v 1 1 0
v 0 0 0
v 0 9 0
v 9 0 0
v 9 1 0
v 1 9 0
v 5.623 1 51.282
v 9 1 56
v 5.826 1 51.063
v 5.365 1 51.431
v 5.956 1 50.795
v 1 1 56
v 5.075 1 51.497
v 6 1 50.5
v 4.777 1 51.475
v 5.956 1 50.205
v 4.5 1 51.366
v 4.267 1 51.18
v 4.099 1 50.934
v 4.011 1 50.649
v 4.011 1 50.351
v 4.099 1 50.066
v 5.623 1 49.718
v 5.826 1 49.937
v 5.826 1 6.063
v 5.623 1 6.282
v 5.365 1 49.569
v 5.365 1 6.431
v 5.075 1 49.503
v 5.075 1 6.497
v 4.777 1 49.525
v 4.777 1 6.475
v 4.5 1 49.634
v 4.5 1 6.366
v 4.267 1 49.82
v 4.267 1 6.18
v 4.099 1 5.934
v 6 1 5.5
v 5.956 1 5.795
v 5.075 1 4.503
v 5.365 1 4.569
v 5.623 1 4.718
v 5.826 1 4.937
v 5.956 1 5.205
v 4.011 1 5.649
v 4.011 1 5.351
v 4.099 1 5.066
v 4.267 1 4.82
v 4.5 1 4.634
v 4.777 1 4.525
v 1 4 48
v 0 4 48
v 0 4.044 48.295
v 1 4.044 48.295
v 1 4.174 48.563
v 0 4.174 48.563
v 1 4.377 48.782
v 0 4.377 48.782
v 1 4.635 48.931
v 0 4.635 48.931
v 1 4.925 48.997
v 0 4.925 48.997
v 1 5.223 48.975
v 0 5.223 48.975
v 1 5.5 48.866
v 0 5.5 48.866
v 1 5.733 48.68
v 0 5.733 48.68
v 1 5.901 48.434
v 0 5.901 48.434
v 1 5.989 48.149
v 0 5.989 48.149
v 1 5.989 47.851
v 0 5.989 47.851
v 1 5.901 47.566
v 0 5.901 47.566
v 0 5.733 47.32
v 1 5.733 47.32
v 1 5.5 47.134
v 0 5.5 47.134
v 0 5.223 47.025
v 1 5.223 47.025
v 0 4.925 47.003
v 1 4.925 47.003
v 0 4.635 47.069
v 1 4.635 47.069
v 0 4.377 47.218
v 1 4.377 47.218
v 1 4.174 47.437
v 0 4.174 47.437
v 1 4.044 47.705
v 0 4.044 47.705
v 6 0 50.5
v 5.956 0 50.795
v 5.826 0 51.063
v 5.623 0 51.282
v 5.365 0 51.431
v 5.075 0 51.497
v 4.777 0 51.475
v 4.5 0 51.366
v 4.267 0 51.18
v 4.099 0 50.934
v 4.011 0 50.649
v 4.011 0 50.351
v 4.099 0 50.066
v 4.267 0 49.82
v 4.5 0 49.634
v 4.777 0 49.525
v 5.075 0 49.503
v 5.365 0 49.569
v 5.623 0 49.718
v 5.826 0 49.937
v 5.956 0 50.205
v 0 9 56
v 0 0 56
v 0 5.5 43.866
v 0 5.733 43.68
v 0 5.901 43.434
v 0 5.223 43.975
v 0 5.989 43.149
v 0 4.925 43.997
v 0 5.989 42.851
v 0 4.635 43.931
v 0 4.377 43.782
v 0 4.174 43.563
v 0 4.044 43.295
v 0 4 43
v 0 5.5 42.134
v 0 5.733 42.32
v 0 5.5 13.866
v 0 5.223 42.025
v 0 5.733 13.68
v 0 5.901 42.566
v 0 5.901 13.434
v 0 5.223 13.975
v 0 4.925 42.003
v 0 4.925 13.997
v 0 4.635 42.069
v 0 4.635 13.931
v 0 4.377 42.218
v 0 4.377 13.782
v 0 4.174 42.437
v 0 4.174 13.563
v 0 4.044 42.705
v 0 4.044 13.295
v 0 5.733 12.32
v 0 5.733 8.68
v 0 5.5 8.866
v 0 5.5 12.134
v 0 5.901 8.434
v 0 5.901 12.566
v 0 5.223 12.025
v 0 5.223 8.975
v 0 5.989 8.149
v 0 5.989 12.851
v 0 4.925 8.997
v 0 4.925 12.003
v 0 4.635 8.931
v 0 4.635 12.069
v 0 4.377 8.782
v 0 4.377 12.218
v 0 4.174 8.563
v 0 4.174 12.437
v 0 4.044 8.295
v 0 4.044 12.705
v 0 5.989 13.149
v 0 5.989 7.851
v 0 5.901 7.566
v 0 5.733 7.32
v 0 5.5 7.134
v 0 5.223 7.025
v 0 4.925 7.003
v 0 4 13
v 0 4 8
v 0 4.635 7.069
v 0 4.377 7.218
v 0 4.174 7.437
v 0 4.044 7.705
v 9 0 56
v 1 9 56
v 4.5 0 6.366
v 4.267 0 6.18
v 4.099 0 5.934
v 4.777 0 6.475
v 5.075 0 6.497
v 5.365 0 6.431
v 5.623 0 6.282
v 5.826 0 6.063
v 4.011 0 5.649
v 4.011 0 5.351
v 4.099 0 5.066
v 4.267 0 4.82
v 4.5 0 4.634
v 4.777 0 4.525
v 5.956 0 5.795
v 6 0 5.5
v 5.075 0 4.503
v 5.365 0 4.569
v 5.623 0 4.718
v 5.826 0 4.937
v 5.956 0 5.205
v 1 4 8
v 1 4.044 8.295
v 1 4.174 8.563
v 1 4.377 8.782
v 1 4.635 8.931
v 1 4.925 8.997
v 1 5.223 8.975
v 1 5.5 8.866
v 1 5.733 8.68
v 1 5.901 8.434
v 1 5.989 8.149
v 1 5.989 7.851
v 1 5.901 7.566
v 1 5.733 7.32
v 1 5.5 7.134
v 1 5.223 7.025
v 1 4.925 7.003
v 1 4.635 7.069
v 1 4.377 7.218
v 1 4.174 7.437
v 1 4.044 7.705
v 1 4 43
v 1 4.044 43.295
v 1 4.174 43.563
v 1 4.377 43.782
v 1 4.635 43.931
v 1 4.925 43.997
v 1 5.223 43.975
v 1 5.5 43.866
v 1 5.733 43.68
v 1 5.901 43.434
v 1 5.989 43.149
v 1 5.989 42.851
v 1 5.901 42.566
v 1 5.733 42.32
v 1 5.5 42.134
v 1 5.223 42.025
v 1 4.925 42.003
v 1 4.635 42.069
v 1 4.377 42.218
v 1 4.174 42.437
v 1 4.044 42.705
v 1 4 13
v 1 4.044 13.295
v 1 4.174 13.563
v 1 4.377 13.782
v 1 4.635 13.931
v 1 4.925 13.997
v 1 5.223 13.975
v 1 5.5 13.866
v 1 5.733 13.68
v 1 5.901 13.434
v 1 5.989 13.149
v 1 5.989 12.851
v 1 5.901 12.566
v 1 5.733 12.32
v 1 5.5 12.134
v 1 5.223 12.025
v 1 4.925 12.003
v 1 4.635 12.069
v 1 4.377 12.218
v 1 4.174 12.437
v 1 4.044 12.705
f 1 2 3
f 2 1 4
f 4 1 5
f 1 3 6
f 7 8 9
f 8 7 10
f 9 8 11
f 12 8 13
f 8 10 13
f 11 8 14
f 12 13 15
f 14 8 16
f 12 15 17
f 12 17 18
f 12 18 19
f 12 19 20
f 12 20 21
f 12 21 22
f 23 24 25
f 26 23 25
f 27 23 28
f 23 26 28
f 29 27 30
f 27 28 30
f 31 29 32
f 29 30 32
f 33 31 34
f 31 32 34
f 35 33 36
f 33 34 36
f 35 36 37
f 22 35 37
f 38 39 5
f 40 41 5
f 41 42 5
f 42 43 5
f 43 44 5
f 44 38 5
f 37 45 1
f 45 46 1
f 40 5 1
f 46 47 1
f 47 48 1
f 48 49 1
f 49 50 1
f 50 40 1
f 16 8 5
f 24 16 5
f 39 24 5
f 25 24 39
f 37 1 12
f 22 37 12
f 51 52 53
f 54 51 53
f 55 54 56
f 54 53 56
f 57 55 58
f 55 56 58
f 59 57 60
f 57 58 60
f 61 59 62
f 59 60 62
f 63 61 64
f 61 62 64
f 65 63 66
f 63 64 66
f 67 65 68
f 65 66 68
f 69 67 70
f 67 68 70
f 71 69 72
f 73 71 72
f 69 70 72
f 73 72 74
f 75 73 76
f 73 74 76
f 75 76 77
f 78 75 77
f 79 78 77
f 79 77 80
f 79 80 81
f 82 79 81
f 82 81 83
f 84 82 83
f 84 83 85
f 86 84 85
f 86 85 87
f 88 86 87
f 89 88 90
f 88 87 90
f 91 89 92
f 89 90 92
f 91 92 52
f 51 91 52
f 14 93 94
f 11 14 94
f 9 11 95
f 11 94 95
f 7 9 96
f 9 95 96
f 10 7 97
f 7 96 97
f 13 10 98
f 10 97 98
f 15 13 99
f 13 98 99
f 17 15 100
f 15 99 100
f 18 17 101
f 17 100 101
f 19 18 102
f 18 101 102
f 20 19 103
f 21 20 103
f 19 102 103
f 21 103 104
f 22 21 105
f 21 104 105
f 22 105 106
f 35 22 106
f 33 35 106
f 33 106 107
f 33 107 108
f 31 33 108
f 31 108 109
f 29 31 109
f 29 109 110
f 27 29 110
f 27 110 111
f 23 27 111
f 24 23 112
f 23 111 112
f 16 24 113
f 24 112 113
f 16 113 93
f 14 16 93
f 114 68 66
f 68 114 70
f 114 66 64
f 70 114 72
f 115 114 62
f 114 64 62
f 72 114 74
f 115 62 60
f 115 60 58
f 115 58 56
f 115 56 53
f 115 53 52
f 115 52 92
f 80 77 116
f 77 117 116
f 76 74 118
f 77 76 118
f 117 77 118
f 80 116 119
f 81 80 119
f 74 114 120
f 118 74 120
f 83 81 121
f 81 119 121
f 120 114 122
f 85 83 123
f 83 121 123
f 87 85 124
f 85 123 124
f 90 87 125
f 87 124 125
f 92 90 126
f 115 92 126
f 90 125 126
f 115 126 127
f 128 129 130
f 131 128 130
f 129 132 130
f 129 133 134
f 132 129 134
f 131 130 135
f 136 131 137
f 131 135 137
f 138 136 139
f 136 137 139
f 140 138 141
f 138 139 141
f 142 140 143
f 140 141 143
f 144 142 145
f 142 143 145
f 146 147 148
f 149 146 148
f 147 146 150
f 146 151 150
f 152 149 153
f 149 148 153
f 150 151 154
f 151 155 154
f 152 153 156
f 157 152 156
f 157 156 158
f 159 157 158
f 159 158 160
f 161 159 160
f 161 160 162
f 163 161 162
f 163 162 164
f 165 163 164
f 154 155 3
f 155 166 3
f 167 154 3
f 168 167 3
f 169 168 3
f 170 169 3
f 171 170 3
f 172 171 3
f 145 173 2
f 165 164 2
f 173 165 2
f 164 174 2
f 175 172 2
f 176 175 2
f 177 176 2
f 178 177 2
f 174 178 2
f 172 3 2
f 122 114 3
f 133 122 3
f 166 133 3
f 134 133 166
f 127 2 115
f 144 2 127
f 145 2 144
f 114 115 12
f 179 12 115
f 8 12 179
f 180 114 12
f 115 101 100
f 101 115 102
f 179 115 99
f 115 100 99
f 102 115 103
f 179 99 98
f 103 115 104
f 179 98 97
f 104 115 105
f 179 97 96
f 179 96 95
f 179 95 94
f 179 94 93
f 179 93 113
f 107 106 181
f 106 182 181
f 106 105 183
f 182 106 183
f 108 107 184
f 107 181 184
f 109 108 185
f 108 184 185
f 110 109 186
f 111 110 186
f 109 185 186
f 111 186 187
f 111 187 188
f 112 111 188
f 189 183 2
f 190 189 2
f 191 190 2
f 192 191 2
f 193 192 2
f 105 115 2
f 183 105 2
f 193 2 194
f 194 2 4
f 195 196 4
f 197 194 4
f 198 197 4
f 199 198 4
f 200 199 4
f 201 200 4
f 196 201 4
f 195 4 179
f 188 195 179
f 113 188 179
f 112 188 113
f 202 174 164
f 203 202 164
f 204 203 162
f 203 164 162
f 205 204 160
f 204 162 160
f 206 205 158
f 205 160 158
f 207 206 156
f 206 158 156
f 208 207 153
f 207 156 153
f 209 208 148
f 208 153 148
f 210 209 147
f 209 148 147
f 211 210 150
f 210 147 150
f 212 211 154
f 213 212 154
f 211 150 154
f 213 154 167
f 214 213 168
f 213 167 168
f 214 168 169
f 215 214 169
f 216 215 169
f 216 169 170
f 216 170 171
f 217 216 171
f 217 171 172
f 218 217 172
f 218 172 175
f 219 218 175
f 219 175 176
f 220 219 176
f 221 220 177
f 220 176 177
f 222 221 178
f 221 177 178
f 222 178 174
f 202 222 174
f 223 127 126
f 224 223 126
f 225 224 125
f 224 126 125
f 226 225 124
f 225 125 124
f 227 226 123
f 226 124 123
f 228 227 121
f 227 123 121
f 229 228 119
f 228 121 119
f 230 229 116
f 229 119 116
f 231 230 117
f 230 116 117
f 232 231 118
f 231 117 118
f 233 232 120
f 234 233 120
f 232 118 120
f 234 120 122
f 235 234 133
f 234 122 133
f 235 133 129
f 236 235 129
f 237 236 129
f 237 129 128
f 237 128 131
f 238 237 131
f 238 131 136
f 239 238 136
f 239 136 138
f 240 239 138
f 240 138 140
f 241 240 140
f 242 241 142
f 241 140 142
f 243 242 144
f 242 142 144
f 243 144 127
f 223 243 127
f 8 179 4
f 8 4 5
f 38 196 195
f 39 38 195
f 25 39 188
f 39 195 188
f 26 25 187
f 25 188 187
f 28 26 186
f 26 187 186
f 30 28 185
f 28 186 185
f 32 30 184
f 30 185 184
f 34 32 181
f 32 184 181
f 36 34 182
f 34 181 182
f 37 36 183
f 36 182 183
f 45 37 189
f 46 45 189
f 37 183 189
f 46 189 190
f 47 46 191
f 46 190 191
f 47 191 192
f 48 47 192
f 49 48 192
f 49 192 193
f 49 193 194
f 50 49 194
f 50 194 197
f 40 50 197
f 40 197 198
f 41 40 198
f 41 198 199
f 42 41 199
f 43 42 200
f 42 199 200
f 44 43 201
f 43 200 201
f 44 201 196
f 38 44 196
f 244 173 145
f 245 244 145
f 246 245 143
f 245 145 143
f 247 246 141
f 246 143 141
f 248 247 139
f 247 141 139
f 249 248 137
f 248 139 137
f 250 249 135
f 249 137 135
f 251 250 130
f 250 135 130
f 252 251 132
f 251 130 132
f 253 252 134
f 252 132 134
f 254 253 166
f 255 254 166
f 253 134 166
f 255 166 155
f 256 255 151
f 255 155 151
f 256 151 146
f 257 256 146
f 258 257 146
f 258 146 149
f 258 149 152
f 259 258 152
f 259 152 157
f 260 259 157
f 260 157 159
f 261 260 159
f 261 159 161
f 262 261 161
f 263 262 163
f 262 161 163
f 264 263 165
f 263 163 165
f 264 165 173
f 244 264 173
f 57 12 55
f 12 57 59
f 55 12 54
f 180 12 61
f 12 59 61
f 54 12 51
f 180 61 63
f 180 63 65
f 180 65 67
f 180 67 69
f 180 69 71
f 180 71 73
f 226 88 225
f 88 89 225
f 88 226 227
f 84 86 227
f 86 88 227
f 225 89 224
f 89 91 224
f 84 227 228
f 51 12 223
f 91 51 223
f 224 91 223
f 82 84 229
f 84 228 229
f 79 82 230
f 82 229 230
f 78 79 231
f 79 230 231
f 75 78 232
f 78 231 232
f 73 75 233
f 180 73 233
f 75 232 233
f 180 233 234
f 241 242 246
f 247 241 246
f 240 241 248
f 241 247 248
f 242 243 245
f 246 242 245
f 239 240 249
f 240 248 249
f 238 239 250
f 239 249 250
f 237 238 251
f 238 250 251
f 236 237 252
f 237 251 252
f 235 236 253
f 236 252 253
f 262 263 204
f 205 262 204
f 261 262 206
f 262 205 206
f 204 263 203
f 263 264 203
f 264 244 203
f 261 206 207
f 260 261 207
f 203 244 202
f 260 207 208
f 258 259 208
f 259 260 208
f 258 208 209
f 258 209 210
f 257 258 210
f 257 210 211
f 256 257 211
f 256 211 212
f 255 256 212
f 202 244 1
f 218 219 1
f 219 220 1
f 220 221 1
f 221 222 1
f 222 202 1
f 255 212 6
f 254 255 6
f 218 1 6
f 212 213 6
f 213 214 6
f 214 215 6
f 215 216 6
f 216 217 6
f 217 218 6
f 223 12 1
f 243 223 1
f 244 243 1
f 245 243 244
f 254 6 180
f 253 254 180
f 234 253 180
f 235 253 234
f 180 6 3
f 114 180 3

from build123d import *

# Parameters (mm, degrees)
F1_DEPTH = 56
F2_R     = 1
F3_DEPTH = 1
F4_R     = 1
F5_DEPTH = 1


with BuildPart() as f1:
    # F0 (on Top) → F1 (new body)
    with BuildSketch(Plane.XY):
        Polygon((0, 9), (0, 0), (9, 0), (9, 1), (1, 1), (1, 9), align=None)
    extrude(amount=F1_DEPTH)

    # F2 (on face) → F3 (cut, through all)
    with BuildSketch(Plane.XZ):
        with Locations((5, 50.5)):
            Circle(F2_R)
        with Locations((5, 5.5)):
            Circle(F2_R)
    extrude(amount=-F3_DEPTH, mode=Mode.SUBTRACT)

    # F4 (on face) → F5 (cut, through all)
    with BuildSketch(Plane(origin=(0, 0, 0), x_dir=(0, -1, 0), z_dir=(-1, 0, 0))):
        with Locations((-5, 48)):
            Circle(F4_R)
        with Locations((-5, 8)):
            Circle(F4_R)
        with Locations((-5, 13)):
            Circle(F4_R)
        with Locations((-5, 43)):
            Circle(F4_R)
    extrude(amount=-F5_DEPTH, mode=Mode.SUBTRACT)


solid = f1.part
